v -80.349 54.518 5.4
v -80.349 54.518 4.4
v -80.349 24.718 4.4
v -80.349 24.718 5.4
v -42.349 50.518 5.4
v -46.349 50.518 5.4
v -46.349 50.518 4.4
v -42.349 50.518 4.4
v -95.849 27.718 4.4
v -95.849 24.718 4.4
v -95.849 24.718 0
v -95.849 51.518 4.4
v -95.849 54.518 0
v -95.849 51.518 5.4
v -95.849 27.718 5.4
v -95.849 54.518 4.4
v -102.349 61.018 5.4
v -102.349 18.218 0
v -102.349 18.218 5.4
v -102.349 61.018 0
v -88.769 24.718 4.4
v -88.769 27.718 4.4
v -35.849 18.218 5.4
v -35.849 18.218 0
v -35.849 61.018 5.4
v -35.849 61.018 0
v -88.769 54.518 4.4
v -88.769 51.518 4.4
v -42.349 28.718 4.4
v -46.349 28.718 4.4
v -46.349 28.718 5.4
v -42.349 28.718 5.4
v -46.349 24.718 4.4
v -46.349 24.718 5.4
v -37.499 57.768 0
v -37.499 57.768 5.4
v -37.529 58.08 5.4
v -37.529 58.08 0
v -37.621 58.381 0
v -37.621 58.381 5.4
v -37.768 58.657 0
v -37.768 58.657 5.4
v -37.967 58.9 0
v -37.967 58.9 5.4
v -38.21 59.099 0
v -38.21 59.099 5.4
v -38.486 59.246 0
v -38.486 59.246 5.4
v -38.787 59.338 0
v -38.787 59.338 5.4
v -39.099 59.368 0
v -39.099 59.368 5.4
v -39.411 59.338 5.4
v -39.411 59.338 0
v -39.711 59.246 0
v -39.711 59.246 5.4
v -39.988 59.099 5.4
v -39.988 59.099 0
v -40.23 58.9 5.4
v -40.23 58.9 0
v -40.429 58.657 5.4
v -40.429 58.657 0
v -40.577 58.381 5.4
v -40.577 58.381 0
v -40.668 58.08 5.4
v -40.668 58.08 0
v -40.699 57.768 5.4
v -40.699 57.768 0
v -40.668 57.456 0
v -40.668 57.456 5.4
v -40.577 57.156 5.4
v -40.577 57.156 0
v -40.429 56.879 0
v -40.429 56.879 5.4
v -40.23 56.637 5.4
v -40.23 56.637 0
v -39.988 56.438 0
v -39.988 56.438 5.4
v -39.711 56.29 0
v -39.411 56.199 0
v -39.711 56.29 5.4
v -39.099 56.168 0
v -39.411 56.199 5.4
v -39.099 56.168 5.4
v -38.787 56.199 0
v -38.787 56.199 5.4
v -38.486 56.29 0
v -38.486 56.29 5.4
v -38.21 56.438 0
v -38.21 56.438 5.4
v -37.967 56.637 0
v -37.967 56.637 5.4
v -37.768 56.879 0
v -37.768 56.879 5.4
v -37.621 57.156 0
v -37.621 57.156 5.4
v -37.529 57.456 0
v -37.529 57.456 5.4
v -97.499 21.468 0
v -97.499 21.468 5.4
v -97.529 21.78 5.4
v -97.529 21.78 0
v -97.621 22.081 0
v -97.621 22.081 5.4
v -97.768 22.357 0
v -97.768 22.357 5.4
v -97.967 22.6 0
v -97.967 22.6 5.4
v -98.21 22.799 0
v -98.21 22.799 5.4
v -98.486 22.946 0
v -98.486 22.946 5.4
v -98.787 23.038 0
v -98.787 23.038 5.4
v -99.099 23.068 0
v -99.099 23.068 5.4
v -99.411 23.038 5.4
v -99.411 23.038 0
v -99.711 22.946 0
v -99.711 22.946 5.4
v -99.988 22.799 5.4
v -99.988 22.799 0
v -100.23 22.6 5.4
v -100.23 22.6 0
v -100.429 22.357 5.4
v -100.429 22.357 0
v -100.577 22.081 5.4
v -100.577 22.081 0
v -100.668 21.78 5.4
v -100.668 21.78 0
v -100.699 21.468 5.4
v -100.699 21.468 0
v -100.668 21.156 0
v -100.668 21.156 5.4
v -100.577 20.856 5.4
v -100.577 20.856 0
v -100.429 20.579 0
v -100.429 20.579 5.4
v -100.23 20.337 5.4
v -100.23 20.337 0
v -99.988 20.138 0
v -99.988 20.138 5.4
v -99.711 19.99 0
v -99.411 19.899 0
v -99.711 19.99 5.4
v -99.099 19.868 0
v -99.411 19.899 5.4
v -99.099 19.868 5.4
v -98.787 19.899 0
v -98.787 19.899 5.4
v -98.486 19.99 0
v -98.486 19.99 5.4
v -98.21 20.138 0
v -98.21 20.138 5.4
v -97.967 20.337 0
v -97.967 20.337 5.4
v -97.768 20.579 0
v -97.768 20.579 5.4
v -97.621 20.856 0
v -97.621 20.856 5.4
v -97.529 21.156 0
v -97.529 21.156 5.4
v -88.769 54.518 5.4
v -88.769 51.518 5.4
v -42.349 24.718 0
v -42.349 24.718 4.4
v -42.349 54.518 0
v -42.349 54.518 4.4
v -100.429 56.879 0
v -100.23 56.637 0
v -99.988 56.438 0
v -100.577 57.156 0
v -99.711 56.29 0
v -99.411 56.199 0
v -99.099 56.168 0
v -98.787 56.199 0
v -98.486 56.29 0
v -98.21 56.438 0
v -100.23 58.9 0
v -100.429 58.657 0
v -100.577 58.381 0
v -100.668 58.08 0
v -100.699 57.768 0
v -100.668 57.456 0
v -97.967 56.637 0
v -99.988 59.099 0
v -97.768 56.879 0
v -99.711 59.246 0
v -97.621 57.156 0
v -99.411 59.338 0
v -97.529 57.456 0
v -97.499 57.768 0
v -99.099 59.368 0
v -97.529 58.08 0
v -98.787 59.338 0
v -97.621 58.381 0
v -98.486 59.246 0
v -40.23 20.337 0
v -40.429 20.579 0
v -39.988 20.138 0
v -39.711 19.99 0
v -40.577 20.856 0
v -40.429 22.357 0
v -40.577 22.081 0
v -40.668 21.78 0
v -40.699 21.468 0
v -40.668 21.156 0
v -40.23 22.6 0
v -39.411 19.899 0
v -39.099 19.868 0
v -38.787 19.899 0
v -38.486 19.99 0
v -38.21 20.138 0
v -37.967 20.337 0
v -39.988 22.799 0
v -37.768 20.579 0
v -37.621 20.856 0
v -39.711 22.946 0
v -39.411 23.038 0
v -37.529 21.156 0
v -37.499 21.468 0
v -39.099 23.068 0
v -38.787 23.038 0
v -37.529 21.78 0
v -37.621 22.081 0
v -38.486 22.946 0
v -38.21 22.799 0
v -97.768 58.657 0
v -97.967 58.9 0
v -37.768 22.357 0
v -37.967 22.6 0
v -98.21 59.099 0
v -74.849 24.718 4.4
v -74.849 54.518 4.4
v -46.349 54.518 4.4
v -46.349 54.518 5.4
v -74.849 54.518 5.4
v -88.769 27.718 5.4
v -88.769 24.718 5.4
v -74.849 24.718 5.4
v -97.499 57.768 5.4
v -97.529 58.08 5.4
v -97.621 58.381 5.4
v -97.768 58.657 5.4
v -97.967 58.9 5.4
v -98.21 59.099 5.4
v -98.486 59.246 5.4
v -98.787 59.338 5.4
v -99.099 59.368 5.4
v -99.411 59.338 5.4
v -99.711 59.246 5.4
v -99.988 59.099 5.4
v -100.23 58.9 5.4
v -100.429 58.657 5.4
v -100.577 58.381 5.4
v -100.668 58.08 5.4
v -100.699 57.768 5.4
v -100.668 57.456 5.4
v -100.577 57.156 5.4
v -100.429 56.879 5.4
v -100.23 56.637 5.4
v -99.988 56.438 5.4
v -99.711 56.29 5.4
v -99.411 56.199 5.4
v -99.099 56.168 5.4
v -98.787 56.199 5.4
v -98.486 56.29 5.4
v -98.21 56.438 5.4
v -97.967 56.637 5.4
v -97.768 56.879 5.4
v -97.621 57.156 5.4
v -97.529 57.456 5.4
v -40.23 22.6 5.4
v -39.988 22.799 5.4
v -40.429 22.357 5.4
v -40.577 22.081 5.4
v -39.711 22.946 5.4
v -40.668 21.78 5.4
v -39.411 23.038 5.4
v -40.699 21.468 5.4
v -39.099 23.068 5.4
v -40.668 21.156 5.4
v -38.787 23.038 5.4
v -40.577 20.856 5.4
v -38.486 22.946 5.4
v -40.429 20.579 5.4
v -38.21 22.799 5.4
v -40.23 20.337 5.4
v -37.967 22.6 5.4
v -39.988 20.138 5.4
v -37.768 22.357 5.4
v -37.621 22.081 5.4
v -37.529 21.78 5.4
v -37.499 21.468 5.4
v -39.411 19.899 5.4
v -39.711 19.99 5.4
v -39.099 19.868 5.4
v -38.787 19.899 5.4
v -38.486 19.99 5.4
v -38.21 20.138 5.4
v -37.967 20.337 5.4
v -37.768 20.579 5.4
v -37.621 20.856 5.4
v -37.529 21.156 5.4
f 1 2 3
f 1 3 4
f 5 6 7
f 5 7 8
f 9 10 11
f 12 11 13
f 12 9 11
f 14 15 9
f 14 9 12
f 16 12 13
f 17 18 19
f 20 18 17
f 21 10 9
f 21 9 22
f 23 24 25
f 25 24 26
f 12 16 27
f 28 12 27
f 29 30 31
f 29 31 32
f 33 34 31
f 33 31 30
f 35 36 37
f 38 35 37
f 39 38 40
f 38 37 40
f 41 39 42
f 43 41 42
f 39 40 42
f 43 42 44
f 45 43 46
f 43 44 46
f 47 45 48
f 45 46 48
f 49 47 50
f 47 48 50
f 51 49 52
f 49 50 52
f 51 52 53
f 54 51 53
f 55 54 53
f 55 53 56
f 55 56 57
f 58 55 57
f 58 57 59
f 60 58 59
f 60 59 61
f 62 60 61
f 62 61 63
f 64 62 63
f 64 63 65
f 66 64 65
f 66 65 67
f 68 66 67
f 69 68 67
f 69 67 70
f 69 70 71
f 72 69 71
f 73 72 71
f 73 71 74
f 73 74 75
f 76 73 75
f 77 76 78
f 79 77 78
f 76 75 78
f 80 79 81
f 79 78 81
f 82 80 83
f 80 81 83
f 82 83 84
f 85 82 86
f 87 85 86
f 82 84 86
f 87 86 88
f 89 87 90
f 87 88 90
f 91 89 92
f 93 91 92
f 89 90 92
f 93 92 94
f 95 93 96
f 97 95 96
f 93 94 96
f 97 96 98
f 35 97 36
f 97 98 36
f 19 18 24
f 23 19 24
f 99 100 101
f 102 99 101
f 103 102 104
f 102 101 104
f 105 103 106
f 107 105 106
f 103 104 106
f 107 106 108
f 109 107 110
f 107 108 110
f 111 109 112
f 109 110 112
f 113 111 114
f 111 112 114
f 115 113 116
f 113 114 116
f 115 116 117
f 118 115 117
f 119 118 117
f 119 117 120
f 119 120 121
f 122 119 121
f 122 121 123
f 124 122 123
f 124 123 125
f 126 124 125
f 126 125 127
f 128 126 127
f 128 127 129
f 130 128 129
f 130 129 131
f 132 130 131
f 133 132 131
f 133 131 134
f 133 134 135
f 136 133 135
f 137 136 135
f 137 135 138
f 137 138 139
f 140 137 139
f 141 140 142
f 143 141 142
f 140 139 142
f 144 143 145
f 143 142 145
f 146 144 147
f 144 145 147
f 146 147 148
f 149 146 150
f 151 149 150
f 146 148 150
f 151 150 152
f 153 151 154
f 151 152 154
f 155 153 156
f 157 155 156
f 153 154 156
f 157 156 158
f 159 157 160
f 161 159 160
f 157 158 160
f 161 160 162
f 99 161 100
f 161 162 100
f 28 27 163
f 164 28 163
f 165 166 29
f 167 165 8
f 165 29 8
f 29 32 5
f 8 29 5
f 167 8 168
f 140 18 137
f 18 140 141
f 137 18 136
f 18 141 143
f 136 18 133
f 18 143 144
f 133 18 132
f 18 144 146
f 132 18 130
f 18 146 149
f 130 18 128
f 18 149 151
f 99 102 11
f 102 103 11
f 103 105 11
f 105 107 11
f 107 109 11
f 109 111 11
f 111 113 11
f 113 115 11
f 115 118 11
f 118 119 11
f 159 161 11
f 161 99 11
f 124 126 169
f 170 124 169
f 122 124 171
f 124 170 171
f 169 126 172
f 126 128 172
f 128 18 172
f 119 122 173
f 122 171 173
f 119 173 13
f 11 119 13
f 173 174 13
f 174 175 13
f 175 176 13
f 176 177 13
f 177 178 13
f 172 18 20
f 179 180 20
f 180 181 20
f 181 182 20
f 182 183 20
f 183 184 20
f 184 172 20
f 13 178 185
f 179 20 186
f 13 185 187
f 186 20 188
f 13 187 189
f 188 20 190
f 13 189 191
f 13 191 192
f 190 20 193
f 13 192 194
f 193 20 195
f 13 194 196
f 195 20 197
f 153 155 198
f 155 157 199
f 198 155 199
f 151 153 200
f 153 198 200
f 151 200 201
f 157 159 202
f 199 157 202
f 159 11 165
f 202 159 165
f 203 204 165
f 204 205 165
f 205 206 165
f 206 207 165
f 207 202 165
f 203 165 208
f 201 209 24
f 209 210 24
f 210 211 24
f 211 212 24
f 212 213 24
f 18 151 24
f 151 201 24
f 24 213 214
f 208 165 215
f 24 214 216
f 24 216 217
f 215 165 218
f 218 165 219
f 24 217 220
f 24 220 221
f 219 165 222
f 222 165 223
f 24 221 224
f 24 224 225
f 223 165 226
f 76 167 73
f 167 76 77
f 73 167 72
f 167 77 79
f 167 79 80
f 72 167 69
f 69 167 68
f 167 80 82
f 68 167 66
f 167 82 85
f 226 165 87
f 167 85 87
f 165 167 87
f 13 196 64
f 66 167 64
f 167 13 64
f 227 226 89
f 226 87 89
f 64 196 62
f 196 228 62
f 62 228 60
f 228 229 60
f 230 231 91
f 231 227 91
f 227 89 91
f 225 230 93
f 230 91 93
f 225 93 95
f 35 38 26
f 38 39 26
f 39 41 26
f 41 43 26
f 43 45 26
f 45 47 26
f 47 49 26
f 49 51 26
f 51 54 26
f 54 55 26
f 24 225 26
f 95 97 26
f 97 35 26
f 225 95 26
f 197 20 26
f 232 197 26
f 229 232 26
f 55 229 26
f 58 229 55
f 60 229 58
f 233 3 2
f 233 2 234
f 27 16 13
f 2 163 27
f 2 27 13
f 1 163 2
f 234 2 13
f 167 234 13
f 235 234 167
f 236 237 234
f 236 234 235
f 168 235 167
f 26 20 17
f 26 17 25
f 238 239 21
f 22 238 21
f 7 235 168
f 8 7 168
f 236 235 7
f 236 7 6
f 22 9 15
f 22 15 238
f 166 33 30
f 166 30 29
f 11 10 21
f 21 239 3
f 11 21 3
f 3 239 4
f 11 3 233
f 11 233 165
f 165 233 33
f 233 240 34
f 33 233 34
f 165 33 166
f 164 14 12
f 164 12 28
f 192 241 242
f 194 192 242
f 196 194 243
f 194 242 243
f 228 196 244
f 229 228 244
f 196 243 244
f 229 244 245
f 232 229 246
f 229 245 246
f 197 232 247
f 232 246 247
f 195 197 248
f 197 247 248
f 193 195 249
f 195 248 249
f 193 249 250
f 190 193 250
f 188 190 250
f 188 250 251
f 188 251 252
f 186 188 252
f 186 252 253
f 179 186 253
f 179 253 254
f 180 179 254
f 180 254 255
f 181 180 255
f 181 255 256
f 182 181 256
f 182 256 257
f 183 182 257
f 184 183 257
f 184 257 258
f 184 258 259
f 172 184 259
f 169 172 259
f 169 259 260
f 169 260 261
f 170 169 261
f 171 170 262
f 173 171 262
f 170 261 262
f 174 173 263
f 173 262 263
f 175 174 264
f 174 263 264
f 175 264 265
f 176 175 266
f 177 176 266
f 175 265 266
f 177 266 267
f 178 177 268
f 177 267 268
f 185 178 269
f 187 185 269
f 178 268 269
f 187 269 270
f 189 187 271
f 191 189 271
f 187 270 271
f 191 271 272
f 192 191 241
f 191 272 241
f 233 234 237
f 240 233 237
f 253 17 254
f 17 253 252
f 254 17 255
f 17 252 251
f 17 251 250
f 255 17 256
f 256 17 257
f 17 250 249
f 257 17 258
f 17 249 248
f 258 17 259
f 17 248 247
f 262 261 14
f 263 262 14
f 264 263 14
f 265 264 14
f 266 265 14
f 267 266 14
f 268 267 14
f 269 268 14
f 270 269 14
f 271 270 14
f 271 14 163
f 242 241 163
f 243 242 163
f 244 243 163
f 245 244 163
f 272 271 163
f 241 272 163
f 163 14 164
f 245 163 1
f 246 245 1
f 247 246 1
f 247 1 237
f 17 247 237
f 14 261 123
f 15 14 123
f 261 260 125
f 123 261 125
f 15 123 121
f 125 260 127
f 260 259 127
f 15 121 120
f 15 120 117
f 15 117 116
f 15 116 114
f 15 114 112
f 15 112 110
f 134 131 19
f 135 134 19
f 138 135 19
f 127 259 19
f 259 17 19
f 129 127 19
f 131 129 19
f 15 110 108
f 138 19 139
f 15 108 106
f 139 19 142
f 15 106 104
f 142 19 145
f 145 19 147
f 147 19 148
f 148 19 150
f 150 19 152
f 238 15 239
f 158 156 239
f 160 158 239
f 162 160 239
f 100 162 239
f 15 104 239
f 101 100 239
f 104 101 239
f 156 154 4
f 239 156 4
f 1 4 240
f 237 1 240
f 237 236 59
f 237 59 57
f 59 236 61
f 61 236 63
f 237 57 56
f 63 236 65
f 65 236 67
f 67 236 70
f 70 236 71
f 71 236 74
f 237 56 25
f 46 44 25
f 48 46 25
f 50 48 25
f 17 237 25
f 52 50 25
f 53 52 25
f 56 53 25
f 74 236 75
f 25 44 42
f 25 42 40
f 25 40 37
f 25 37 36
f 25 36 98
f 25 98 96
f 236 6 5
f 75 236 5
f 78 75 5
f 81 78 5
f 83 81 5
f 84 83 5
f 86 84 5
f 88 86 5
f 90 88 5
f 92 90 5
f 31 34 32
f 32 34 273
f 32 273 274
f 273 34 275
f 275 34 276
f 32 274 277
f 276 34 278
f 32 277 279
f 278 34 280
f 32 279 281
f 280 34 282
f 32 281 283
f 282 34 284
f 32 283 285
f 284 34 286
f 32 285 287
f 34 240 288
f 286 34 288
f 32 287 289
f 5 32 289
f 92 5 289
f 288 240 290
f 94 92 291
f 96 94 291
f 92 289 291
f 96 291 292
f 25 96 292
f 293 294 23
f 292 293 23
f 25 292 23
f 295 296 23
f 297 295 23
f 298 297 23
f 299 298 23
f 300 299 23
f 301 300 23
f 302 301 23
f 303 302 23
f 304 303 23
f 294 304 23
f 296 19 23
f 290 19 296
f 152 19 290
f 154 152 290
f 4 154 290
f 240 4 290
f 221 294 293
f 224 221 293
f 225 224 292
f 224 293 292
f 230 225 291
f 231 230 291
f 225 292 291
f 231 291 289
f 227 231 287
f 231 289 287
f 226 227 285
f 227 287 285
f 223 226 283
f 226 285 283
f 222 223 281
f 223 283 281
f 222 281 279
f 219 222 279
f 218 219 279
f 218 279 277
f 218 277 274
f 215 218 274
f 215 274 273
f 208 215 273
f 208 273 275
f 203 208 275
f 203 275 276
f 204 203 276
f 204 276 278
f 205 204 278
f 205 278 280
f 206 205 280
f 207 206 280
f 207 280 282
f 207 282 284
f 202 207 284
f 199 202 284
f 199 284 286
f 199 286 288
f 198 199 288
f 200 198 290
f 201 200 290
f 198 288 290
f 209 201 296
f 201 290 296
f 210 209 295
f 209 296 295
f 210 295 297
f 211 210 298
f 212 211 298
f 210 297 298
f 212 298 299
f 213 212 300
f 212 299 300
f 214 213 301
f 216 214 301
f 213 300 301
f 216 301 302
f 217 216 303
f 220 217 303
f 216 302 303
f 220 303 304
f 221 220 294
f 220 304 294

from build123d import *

# Parameters (mm, degrees)
SZKIC1_W                    = 66.5
SZKIC1_H                    = 42.8
DODANIE_WYCI_GNI_CIE1_DEPTH = 5.4
SZKIC2_W                    = 53.5
SZKIC2_H                    = 29.8
WYTNIJ_WYCI_GNI_CIE1_DEPTH  = 120.279744778
SZKIC3_R                    = 1.6
WYTNIJ_WYCI_GNI_CIE2_DEPTH  = 10
SZKIC5_W                    = 5.5
SZKIC5_H                    = 1
DODANIE_WYCI_GNI_CIE2_DEPTH = 29.8
SZKIC6_W                    = 4
SZKIC6_H                    = 1
DODANIE_WYCI_GNI_CIE3_DEPTH = 4
SZKIC7_W                    = 4
SZKIC7_H                    = 1
DODANIE_WYCI_GNI_CIE4_DEPTH = 4
SZKIC8_W                    = 7.080014019
SZKIC8_H                    = 1
DODANIE_WYCI_GNI_CIE5_DEPTH = 3
SZKIC9_W                    = 7.08
SZKIC9_H                    = 1
DODANIE_WYCI_GNI_CIE6_DEPTH = 3


with BuildPart() as part:
    # Szkic1 → Dodanie-wyciągnięcie1 (new body)
    with BuildSketch(Plane.XY):
        with Locations((-69.098753826, 39.618276807)):
            Rectangle(SZKIC1_W, SZKIC1_H)
    extrude(amount=DODANIE_WYCI_GNI_CIE1_DEPTH)

    # Szkic2 → Wytnij-wyciągnięcie1 (cut, through all)
    with BuildSketch(Plane.XY.offset(5.4)):
        with Locations((-69.098753826, 39.618276807)):
            Rectangle(SZKIC2_W, SZKIC2_H)
    extrude(amount=-WYTNIJ_WYCI_GNI_CIE1_DEPTH, mode=Mode.SUBTRACT)

    # Szkic3 → Wytnij-wyciągnięcie2 (cut)
    with BuildSketch(Plane.XY.offset(5.4)):
        with Locations((-99.098753826, 57.768276807)):
            Circle(SZKIC3_R)
        with Locations((-39.098753826, 57.768276807)):
            Circle(SZKIC3_R)
        with Locations((-39.098753826, 21.468276807)):
            Circle(SZKIC3_R)
        with Locations((-99.098753826, 21.468276807)):
            Circle(SZKIC3_R)
    extrude(amount=-WYTNIJ_WYCI_GNI_CIE2_DEPTH, mode=Mode.SUBTRACT)

    # Szkic5 → Dodanie-wyciągnięcie2 (add)
    with BuildSketch(Plane.XZ.offset(-54.518276807)):
        with Locations((-77.598753826, 4.9)):
            Rectangle(SZKIC5_W, SZKIC5_H)
    extrude(amount=DODANIE_WYCI_GNI_CIE2_DEPTH)

    # Szkic6 → Dodanie-wyciągnięcie3 (add)
    with BuildSketch(Plane.XZ.offset(-54.518276807)):
        with Locations((-44.348753826, 4.9)):
            Rectangle(SZKIC6_W, SZKIC6_H)
    extrude(amount=DODANIE_WYCI_GNI_CIE3_DEPTH)

    # Szkic7 → Dodanie-wyciągnięcie4 (add)
    with BuildSketch(Plane(origin=(0, 24.718276807, 0), x_dir=(1, 0, 0), z_dir=(0, 1, 0))):
        with Locations((-44.348753826, -4.9)):
            Rectangle(SZKIC7_W, SZKIC7_H)
    extrude(amount=DODANIE_WYCI_GNI_CIE4_DEPTH)

    # Szkic8 → Dodanie-wyciągnięcie5 (add)
    with BuildSketch(Plane.XZ.offset(-54.518276807)):
        with Locations((-92.308746817, 4.9)):
            Rectangle(SZKIC8_W, SZKIC8_H)
    extrude(amount=DODANIE_WYCI_GNI_CIE5_DEPTH)

    # Szkic9 → Dodanie-wyciągnięcie6 (add)
    with BuildSketch(Plane(origin=(0, 24.718276807, 0), x_dir=(1, 0, 0), z_dir=(0, 1, 0))):
        with Locations((-92.308753826, -4.9)):
            Rectangle(SZKIC9_W, SZKIC9_H)
    extrude(amount=DODANIE_WYCI_GNI_CIE6_DEPTH)


solid = part.part
